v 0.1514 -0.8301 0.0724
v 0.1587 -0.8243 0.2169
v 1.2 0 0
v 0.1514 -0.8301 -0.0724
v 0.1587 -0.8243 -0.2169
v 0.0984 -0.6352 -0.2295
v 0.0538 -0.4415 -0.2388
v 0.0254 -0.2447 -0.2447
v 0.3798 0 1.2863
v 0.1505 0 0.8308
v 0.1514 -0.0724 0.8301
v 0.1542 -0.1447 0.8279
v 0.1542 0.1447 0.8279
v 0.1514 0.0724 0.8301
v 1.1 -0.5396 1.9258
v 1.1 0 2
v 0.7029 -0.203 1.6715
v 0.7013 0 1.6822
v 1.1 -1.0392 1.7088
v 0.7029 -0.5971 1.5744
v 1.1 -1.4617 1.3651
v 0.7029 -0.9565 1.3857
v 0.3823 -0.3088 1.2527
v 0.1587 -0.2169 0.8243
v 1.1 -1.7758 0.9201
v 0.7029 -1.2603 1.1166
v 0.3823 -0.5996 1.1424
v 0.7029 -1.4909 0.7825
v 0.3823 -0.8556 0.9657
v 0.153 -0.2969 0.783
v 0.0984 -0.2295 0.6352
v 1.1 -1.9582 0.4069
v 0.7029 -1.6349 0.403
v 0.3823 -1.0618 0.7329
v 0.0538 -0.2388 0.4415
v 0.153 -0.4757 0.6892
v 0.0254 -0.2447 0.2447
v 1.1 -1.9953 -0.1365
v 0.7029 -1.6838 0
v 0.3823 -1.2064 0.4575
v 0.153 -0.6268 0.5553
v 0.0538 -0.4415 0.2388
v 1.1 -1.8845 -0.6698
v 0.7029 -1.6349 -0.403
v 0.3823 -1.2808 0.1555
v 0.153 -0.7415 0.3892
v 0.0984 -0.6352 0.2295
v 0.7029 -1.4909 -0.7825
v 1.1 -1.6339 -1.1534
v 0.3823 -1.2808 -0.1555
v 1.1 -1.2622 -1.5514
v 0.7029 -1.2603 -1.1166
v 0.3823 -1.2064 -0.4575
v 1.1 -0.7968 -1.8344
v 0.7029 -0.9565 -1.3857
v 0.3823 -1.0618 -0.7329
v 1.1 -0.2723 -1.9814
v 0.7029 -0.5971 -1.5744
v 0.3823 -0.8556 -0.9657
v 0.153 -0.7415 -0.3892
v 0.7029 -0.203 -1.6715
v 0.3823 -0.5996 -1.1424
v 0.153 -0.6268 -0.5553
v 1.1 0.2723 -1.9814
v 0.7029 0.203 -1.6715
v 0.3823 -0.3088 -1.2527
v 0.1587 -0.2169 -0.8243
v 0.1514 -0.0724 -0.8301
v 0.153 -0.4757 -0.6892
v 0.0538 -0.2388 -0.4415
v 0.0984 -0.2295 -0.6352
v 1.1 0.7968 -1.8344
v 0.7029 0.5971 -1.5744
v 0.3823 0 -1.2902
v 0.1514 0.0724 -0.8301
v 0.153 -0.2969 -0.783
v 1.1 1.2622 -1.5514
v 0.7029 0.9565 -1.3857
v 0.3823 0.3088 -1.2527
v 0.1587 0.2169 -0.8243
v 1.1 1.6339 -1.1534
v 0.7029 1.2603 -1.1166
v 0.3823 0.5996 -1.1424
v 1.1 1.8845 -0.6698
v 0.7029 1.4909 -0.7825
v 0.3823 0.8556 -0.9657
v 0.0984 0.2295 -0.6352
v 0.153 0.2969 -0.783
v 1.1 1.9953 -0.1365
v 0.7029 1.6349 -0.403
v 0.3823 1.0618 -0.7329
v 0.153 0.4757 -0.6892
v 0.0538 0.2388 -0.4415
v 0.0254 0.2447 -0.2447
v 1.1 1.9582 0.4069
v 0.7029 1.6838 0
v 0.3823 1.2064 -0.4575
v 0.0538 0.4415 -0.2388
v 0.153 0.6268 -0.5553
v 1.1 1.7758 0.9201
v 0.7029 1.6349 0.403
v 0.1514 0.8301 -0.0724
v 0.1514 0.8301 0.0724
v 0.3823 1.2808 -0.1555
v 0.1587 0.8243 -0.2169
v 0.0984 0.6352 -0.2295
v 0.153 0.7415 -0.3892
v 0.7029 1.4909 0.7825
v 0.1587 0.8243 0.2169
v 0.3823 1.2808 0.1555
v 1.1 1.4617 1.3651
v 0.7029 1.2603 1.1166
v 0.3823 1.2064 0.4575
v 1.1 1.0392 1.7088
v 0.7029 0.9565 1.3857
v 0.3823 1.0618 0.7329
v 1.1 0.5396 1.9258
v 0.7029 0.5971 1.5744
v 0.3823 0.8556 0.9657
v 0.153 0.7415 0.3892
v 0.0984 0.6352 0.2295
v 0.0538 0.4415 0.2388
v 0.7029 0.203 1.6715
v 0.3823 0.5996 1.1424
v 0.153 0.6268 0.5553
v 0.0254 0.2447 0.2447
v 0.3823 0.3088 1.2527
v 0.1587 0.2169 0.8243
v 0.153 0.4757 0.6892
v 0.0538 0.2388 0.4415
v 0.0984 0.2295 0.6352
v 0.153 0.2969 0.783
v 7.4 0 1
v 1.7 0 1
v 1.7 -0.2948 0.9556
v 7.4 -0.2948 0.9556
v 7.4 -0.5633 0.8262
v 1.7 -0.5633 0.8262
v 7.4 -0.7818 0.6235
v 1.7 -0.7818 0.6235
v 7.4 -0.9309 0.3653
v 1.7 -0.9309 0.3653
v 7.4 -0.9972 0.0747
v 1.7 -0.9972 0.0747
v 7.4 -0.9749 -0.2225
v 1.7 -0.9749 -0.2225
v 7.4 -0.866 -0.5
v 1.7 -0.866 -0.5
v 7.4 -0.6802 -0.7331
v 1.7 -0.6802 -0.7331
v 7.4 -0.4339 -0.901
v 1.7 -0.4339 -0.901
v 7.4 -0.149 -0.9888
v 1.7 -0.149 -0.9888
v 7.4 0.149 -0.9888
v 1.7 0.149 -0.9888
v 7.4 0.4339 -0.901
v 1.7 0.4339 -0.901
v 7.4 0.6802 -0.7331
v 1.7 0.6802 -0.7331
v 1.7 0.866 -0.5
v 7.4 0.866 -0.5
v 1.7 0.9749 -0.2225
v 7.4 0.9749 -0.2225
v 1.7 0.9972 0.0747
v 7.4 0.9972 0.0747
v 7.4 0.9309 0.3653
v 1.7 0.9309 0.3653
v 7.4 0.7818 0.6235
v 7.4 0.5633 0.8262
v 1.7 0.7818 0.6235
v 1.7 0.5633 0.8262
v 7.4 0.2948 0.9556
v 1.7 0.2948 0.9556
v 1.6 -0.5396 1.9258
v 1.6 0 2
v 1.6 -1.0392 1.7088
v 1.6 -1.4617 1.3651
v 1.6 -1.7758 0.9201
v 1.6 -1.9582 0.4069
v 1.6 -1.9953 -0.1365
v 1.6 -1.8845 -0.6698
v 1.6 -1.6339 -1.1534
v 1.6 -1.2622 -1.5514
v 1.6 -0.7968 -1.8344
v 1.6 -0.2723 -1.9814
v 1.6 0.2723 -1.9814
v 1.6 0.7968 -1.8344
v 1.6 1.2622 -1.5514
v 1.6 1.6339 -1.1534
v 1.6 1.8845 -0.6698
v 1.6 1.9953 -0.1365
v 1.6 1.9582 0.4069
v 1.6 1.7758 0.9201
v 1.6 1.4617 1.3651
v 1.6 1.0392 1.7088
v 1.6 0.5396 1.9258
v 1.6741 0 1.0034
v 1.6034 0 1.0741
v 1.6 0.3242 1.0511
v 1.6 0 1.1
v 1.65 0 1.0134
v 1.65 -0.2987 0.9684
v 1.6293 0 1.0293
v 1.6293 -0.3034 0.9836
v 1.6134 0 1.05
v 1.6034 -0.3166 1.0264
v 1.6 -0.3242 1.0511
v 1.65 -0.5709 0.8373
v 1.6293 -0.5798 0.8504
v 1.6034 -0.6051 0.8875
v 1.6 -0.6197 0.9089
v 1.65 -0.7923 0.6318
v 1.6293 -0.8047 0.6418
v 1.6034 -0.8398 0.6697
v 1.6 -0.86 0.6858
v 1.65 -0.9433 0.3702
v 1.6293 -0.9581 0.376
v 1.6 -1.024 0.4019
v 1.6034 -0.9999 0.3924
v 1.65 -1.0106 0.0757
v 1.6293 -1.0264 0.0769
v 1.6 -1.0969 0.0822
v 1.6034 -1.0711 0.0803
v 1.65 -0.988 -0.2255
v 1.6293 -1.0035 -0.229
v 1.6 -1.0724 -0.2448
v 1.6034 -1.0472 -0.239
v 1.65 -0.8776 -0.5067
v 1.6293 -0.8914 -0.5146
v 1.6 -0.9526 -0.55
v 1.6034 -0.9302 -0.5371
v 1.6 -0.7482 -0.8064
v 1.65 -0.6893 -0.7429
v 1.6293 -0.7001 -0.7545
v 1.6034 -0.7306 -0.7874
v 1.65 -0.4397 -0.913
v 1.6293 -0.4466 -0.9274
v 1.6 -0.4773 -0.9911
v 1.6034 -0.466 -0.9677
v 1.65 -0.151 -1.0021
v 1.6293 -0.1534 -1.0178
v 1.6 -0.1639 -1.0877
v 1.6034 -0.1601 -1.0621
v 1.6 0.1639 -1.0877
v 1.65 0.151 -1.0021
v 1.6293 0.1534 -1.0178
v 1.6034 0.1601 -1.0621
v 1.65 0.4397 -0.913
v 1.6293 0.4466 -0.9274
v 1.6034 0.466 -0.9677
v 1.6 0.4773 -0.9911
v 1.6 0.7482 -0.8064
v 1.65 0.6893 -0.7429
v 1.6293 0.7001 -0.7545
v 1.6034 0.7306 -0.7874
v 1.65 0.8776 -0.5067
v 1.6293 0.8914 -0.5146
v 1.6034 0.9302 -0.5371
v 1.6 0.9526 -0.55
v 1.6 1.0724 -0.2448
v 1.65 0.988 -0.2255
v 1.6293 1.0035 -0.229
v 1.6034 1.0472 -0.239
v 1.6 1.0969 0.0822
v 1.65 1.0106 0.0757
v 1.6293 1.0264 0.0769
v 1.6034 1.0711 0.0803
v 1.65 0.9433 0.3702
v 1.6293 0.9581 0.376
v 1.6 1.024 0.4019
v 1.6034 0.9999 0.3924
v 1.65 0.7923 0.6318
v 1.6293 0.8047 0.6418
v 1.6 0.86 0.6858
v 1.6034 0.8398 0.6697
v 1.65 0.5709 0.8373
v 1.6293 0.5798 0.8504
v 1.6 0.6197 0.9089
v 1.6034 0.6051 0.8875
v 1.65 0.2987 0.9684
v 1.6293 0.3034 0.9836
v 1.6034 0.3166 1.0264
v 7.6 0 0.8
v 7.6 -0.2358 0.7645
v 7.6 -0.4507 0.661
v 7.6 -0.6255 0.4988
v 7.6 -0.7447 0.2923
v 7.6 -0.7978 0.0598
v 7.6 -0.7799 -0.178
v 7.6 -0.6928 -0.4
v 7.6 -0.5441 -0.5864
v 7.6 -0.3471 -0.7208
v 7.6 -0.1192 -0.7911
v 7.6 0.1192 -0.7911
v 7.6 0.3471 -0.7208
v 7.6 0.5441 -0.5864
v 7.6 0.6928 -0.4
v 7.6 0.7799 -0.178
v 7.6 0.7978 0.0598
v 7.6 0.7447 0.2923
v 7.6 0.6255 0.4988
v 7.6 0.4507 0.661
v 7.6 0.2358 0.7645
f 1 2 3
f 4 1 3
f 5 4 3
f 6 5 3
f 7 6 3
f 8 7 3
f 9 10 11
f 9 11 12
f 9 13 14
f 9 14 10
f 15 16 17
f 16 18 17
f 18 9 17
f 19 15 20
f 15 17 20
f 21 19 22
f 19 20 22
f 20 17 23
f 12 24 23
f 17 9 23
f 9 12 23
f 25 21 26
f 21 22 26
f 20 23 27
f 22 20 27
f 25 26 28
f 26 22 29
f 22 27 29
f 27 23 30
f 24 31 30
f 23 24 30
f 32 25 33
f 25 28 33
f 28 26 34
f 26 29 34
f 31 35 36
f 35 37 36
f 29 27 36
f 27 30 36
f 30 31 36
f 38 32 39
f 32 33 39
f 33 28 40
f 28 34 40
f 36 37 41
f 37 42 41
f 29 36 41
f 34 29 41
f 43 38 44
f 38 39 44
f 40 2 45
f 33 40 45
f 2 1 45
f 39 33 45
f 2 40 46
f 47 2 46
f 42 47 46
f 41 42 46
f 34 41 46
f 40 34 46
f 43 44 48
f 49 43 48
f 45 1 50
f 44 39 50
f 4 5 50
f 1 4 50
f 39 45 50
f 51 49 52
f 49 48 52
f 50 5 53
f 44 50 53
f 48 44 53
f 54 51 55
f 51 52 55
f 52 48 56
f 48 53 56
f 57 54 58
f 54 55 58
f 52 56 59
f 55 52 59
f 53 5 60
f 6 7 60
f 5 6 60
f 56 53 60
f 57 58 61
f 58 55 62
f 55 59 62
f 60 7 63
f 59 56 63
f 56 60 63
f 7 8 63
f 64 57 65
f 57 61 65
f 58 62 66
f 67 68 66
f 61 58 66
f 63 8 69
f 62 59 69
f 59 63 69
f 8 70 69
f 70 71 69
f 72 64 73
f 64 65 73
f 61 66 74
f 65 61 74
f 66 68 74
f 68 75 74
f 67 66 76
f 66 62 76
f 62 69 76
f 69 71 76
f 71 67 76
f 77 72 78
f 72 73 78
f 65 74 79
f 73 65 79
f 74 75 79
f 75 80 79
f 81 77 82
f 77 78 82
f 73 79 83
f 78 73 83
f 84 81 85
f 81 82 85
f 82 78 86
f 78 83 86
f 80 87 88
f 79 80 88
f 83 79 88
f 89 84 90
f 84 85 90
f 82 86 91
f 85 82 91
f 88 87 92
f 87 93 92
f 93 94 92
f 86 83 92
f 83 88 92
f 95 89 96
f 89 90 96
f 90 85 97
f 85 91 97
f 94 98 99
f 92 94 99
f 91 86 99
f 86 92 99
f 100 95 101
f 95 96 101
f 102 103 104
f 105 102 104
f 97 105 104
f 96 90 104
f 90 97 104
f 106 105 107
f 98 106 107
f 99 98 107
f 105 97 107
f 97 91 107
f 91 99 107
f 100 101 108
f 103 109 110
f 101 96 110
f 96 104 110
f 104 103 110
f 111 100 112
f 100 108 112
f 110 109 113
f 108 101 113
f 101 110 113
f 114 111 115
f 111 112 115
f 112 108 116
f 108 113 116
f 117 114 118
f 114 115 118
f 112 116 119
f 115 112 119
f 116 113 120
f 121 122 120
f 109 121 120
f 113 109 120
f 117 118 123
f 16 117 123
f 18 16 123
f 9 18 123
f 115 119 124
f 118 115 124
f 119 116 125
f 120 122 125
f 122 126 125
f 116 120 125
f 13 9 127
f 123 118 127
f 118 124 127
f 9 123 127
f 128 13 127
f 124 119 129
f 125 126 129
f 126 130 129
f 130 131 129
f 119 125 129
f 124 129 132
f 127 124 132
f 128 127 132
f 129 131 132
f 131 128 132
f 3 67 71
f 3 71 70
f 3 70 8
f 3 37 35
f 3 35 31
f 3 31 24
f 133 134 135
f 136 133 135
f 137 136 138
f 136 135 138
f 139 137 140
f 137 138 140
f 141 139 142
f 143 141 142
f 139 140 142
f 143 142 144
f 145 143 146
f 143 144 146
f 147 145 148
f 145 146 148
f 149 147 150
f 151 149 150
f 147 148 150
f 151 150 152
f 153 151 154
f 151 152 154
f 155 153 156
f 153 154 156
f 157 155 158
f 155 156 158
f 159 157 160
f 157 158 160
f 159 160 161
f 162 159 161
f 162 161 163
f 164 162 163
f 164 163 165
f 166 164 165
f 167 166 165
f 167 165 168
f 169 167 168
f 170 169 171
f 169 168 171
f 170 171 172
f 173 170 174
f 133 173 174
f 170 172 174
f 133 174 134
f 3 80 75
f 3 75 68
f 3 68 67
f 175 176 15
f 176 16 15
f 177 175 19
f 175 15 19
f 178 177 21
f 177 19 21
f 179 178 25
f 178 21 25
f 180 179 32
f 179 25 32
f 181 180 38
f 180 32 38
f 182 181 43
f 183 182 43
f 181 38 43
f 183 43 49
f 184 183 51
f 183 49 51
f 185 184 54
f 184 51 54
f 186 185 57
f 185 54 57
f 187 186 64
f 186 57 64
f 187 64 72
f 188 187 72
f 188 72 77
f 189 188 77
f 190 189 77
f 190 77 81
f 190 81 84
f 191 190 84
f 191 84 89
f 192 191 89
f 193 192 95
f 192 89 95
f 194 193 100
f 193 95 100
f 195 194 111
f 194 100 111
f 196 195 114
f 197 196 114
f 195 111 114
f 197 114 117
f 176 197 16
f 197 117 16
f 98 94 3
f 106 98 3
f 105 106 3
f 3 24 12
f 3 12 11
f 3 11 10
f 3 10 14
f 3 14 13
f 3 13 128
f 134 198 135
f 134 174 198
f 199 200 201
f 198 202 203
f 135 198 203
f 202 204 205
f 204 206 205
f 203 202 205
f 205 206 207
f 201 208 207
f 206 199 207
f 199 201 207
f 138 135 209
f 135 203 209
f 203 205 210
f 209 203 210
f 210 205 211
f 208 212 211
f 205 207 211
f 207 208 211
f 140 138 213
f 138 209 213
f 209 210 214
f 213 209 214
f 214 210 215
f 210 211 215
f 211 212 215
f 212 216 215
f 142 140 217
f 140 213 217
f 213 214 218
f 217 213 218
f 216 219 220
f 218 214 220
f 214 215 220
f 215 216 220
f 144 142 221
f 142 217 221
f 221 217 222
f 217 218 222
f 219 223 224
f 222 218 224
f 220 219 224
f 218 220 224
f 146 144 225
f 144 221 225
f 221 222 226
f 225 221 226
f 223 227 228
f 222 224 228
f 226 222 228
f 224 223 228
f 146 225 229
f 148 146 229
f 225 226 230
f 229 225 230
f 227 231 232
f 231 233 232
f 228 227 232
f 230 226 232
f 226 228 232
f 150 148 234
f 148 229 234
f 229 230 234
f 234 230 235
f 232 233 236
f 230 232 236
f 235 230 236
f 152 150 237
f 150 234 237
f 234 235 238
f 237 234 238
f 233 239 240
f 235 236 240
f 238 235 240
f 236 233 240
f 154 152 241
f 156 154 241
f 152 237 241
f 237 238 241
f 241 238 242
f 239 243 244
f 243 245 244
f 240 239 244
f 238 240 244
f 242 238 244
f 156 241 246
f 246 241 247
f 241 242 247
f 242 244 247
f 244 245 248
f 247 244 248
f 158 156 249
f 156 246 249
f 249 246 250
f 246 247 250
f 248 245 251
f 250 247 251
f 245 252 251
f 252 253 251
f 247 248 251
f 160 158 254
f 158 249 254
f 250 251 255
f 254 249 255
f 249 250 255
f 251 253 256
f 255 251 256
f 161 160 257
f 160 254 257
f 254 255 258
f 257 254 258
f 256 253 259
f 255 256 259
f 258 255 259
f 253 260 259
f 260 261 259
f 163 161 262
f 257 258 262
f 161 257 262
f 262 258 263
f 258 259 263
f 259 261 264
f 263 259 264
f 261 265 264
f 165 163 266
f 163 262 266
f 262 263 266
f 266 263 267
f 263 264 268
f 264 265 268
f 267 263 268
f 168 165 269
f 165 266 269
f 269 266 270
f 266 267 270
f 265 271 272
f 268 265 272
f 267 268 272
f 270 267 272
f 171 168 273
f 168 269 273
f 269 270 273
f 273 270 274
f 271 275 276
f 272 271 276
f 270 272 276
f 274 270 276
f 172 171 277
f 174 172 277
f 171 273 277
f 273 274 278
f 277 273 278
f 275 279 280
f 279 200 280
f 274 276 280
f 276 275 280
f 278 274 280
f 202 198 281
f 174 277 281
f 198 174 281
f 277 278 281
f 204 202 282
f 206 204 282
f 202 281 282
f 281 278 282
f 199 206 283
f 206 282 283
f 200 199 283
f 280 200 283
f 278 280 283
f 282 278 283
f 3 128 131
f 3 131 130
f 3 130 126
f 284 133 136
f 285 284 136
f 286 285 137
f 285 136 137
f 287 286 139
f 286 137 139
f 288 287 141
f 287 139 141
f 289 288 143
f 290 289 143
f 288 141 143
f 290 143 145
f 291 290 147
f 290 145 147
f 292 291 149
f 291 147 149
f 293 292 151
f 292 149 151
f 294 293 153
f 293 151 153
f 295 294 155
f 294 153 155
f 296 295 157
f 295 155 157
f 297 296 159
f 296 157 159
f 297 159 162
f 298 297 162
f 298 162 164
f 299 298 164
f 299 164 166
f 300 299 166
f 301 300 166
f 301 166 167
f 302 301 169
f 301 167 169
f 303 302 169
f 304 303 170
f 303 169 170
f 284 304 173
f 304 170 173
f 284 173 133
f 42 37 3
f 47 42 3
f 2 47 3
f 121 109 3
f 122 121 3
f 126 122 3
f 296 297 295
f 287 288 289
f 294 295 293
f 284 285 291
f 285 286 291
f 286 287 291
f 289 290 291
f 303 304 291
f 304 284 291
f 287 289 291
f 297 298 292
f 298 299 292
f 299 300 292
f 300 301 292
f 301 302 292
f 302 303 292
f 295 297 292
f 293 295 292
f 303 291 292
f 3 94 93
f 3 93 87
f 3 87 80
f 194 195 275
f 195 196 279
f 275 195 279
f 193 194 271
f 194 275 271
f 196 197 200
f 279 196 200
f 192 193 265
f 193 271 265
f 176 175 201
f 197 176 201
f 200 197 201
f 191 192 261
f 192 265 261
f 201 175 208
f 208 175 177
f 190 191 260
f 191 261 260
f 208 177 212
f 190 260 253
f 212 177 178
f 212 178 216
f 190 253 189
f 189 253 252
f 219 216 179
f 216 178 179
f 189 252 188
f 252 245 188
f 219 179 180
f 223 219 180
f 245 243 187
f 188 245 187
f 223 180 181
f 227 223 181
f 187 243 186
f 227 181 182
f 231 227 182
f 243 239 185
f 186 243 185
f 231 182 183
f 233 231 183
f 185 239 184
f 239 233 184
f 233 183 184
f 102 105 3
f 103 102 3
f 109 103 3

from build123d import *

# Parameters (mm, degrees)
CHAMFER_1_SIZE = 0.2


with BuildPart() as part:
    # 草图2 → Revolve 539 (revolve)
    with BuildSketch(Plane.XY):
        with BuildLine():
            Line((0, 0), (7.6, 0))
            Line((7.6, 0), (7.6, 1))
            Line((7.6, 1), (1.7, 1))
            ThreePointArc((1.7, 1), (1.629289322, 1.029289322), (1.6, 1.1))
            Line((1.6, 1.1), (1.6, 2))
            Line((1.6, 2), (1.1, 2))
            ThreePointArc((1.1, 2), (0.293143234, 1.141271221), (0, 0))
        make_face()
    revolve(axis=Axis((-1.331757704, 0, 0), (1, 0, 0)))

    # 草图5 → 切除-放样1 section 0
    with BuildSketch(Plane(origin=(0, 0, 0), x_dir=(0, 0, -1), z_dir=(1, 0, 0)), mode=Mode.PRIVATE) as loft_1_s0:
        with BuildLine():
            Line((0.25, 0.95), (-0.25, 0.95))
            Line((-0.25, 0.95), (-0.25, -0.95))
            Line((-0.25, -0.95), (0.25, -0.95))
            Line((0.25, -0.95), (0.25, 0.95))
        make_face()
    loft_1 = loft([Vertex(1.2, 0, 0), loft_1_s0.sketch], mode=Mode.SUBTRACT)

    # 镜向1: 切除-放样1 across plane
    add(loft_1.mirror(Plane(origin=(0, 0, 0), x_dir=(0, 0.7071067811865462, 0.7071067811865488), z_dir=(0, -0.7071067811865488, 0.7071067811865462))), mode=Mode.SUBTRACT)

    # 倒角1
    chamfer_1_edges = [part.edges().sort_by_distance(p)[0] for p in [
        (7.6, -1, 0),
    ]]
    chamfer(chamfer_1_edges, length=CHAMFER_1_SIZE)


solid = part.part
